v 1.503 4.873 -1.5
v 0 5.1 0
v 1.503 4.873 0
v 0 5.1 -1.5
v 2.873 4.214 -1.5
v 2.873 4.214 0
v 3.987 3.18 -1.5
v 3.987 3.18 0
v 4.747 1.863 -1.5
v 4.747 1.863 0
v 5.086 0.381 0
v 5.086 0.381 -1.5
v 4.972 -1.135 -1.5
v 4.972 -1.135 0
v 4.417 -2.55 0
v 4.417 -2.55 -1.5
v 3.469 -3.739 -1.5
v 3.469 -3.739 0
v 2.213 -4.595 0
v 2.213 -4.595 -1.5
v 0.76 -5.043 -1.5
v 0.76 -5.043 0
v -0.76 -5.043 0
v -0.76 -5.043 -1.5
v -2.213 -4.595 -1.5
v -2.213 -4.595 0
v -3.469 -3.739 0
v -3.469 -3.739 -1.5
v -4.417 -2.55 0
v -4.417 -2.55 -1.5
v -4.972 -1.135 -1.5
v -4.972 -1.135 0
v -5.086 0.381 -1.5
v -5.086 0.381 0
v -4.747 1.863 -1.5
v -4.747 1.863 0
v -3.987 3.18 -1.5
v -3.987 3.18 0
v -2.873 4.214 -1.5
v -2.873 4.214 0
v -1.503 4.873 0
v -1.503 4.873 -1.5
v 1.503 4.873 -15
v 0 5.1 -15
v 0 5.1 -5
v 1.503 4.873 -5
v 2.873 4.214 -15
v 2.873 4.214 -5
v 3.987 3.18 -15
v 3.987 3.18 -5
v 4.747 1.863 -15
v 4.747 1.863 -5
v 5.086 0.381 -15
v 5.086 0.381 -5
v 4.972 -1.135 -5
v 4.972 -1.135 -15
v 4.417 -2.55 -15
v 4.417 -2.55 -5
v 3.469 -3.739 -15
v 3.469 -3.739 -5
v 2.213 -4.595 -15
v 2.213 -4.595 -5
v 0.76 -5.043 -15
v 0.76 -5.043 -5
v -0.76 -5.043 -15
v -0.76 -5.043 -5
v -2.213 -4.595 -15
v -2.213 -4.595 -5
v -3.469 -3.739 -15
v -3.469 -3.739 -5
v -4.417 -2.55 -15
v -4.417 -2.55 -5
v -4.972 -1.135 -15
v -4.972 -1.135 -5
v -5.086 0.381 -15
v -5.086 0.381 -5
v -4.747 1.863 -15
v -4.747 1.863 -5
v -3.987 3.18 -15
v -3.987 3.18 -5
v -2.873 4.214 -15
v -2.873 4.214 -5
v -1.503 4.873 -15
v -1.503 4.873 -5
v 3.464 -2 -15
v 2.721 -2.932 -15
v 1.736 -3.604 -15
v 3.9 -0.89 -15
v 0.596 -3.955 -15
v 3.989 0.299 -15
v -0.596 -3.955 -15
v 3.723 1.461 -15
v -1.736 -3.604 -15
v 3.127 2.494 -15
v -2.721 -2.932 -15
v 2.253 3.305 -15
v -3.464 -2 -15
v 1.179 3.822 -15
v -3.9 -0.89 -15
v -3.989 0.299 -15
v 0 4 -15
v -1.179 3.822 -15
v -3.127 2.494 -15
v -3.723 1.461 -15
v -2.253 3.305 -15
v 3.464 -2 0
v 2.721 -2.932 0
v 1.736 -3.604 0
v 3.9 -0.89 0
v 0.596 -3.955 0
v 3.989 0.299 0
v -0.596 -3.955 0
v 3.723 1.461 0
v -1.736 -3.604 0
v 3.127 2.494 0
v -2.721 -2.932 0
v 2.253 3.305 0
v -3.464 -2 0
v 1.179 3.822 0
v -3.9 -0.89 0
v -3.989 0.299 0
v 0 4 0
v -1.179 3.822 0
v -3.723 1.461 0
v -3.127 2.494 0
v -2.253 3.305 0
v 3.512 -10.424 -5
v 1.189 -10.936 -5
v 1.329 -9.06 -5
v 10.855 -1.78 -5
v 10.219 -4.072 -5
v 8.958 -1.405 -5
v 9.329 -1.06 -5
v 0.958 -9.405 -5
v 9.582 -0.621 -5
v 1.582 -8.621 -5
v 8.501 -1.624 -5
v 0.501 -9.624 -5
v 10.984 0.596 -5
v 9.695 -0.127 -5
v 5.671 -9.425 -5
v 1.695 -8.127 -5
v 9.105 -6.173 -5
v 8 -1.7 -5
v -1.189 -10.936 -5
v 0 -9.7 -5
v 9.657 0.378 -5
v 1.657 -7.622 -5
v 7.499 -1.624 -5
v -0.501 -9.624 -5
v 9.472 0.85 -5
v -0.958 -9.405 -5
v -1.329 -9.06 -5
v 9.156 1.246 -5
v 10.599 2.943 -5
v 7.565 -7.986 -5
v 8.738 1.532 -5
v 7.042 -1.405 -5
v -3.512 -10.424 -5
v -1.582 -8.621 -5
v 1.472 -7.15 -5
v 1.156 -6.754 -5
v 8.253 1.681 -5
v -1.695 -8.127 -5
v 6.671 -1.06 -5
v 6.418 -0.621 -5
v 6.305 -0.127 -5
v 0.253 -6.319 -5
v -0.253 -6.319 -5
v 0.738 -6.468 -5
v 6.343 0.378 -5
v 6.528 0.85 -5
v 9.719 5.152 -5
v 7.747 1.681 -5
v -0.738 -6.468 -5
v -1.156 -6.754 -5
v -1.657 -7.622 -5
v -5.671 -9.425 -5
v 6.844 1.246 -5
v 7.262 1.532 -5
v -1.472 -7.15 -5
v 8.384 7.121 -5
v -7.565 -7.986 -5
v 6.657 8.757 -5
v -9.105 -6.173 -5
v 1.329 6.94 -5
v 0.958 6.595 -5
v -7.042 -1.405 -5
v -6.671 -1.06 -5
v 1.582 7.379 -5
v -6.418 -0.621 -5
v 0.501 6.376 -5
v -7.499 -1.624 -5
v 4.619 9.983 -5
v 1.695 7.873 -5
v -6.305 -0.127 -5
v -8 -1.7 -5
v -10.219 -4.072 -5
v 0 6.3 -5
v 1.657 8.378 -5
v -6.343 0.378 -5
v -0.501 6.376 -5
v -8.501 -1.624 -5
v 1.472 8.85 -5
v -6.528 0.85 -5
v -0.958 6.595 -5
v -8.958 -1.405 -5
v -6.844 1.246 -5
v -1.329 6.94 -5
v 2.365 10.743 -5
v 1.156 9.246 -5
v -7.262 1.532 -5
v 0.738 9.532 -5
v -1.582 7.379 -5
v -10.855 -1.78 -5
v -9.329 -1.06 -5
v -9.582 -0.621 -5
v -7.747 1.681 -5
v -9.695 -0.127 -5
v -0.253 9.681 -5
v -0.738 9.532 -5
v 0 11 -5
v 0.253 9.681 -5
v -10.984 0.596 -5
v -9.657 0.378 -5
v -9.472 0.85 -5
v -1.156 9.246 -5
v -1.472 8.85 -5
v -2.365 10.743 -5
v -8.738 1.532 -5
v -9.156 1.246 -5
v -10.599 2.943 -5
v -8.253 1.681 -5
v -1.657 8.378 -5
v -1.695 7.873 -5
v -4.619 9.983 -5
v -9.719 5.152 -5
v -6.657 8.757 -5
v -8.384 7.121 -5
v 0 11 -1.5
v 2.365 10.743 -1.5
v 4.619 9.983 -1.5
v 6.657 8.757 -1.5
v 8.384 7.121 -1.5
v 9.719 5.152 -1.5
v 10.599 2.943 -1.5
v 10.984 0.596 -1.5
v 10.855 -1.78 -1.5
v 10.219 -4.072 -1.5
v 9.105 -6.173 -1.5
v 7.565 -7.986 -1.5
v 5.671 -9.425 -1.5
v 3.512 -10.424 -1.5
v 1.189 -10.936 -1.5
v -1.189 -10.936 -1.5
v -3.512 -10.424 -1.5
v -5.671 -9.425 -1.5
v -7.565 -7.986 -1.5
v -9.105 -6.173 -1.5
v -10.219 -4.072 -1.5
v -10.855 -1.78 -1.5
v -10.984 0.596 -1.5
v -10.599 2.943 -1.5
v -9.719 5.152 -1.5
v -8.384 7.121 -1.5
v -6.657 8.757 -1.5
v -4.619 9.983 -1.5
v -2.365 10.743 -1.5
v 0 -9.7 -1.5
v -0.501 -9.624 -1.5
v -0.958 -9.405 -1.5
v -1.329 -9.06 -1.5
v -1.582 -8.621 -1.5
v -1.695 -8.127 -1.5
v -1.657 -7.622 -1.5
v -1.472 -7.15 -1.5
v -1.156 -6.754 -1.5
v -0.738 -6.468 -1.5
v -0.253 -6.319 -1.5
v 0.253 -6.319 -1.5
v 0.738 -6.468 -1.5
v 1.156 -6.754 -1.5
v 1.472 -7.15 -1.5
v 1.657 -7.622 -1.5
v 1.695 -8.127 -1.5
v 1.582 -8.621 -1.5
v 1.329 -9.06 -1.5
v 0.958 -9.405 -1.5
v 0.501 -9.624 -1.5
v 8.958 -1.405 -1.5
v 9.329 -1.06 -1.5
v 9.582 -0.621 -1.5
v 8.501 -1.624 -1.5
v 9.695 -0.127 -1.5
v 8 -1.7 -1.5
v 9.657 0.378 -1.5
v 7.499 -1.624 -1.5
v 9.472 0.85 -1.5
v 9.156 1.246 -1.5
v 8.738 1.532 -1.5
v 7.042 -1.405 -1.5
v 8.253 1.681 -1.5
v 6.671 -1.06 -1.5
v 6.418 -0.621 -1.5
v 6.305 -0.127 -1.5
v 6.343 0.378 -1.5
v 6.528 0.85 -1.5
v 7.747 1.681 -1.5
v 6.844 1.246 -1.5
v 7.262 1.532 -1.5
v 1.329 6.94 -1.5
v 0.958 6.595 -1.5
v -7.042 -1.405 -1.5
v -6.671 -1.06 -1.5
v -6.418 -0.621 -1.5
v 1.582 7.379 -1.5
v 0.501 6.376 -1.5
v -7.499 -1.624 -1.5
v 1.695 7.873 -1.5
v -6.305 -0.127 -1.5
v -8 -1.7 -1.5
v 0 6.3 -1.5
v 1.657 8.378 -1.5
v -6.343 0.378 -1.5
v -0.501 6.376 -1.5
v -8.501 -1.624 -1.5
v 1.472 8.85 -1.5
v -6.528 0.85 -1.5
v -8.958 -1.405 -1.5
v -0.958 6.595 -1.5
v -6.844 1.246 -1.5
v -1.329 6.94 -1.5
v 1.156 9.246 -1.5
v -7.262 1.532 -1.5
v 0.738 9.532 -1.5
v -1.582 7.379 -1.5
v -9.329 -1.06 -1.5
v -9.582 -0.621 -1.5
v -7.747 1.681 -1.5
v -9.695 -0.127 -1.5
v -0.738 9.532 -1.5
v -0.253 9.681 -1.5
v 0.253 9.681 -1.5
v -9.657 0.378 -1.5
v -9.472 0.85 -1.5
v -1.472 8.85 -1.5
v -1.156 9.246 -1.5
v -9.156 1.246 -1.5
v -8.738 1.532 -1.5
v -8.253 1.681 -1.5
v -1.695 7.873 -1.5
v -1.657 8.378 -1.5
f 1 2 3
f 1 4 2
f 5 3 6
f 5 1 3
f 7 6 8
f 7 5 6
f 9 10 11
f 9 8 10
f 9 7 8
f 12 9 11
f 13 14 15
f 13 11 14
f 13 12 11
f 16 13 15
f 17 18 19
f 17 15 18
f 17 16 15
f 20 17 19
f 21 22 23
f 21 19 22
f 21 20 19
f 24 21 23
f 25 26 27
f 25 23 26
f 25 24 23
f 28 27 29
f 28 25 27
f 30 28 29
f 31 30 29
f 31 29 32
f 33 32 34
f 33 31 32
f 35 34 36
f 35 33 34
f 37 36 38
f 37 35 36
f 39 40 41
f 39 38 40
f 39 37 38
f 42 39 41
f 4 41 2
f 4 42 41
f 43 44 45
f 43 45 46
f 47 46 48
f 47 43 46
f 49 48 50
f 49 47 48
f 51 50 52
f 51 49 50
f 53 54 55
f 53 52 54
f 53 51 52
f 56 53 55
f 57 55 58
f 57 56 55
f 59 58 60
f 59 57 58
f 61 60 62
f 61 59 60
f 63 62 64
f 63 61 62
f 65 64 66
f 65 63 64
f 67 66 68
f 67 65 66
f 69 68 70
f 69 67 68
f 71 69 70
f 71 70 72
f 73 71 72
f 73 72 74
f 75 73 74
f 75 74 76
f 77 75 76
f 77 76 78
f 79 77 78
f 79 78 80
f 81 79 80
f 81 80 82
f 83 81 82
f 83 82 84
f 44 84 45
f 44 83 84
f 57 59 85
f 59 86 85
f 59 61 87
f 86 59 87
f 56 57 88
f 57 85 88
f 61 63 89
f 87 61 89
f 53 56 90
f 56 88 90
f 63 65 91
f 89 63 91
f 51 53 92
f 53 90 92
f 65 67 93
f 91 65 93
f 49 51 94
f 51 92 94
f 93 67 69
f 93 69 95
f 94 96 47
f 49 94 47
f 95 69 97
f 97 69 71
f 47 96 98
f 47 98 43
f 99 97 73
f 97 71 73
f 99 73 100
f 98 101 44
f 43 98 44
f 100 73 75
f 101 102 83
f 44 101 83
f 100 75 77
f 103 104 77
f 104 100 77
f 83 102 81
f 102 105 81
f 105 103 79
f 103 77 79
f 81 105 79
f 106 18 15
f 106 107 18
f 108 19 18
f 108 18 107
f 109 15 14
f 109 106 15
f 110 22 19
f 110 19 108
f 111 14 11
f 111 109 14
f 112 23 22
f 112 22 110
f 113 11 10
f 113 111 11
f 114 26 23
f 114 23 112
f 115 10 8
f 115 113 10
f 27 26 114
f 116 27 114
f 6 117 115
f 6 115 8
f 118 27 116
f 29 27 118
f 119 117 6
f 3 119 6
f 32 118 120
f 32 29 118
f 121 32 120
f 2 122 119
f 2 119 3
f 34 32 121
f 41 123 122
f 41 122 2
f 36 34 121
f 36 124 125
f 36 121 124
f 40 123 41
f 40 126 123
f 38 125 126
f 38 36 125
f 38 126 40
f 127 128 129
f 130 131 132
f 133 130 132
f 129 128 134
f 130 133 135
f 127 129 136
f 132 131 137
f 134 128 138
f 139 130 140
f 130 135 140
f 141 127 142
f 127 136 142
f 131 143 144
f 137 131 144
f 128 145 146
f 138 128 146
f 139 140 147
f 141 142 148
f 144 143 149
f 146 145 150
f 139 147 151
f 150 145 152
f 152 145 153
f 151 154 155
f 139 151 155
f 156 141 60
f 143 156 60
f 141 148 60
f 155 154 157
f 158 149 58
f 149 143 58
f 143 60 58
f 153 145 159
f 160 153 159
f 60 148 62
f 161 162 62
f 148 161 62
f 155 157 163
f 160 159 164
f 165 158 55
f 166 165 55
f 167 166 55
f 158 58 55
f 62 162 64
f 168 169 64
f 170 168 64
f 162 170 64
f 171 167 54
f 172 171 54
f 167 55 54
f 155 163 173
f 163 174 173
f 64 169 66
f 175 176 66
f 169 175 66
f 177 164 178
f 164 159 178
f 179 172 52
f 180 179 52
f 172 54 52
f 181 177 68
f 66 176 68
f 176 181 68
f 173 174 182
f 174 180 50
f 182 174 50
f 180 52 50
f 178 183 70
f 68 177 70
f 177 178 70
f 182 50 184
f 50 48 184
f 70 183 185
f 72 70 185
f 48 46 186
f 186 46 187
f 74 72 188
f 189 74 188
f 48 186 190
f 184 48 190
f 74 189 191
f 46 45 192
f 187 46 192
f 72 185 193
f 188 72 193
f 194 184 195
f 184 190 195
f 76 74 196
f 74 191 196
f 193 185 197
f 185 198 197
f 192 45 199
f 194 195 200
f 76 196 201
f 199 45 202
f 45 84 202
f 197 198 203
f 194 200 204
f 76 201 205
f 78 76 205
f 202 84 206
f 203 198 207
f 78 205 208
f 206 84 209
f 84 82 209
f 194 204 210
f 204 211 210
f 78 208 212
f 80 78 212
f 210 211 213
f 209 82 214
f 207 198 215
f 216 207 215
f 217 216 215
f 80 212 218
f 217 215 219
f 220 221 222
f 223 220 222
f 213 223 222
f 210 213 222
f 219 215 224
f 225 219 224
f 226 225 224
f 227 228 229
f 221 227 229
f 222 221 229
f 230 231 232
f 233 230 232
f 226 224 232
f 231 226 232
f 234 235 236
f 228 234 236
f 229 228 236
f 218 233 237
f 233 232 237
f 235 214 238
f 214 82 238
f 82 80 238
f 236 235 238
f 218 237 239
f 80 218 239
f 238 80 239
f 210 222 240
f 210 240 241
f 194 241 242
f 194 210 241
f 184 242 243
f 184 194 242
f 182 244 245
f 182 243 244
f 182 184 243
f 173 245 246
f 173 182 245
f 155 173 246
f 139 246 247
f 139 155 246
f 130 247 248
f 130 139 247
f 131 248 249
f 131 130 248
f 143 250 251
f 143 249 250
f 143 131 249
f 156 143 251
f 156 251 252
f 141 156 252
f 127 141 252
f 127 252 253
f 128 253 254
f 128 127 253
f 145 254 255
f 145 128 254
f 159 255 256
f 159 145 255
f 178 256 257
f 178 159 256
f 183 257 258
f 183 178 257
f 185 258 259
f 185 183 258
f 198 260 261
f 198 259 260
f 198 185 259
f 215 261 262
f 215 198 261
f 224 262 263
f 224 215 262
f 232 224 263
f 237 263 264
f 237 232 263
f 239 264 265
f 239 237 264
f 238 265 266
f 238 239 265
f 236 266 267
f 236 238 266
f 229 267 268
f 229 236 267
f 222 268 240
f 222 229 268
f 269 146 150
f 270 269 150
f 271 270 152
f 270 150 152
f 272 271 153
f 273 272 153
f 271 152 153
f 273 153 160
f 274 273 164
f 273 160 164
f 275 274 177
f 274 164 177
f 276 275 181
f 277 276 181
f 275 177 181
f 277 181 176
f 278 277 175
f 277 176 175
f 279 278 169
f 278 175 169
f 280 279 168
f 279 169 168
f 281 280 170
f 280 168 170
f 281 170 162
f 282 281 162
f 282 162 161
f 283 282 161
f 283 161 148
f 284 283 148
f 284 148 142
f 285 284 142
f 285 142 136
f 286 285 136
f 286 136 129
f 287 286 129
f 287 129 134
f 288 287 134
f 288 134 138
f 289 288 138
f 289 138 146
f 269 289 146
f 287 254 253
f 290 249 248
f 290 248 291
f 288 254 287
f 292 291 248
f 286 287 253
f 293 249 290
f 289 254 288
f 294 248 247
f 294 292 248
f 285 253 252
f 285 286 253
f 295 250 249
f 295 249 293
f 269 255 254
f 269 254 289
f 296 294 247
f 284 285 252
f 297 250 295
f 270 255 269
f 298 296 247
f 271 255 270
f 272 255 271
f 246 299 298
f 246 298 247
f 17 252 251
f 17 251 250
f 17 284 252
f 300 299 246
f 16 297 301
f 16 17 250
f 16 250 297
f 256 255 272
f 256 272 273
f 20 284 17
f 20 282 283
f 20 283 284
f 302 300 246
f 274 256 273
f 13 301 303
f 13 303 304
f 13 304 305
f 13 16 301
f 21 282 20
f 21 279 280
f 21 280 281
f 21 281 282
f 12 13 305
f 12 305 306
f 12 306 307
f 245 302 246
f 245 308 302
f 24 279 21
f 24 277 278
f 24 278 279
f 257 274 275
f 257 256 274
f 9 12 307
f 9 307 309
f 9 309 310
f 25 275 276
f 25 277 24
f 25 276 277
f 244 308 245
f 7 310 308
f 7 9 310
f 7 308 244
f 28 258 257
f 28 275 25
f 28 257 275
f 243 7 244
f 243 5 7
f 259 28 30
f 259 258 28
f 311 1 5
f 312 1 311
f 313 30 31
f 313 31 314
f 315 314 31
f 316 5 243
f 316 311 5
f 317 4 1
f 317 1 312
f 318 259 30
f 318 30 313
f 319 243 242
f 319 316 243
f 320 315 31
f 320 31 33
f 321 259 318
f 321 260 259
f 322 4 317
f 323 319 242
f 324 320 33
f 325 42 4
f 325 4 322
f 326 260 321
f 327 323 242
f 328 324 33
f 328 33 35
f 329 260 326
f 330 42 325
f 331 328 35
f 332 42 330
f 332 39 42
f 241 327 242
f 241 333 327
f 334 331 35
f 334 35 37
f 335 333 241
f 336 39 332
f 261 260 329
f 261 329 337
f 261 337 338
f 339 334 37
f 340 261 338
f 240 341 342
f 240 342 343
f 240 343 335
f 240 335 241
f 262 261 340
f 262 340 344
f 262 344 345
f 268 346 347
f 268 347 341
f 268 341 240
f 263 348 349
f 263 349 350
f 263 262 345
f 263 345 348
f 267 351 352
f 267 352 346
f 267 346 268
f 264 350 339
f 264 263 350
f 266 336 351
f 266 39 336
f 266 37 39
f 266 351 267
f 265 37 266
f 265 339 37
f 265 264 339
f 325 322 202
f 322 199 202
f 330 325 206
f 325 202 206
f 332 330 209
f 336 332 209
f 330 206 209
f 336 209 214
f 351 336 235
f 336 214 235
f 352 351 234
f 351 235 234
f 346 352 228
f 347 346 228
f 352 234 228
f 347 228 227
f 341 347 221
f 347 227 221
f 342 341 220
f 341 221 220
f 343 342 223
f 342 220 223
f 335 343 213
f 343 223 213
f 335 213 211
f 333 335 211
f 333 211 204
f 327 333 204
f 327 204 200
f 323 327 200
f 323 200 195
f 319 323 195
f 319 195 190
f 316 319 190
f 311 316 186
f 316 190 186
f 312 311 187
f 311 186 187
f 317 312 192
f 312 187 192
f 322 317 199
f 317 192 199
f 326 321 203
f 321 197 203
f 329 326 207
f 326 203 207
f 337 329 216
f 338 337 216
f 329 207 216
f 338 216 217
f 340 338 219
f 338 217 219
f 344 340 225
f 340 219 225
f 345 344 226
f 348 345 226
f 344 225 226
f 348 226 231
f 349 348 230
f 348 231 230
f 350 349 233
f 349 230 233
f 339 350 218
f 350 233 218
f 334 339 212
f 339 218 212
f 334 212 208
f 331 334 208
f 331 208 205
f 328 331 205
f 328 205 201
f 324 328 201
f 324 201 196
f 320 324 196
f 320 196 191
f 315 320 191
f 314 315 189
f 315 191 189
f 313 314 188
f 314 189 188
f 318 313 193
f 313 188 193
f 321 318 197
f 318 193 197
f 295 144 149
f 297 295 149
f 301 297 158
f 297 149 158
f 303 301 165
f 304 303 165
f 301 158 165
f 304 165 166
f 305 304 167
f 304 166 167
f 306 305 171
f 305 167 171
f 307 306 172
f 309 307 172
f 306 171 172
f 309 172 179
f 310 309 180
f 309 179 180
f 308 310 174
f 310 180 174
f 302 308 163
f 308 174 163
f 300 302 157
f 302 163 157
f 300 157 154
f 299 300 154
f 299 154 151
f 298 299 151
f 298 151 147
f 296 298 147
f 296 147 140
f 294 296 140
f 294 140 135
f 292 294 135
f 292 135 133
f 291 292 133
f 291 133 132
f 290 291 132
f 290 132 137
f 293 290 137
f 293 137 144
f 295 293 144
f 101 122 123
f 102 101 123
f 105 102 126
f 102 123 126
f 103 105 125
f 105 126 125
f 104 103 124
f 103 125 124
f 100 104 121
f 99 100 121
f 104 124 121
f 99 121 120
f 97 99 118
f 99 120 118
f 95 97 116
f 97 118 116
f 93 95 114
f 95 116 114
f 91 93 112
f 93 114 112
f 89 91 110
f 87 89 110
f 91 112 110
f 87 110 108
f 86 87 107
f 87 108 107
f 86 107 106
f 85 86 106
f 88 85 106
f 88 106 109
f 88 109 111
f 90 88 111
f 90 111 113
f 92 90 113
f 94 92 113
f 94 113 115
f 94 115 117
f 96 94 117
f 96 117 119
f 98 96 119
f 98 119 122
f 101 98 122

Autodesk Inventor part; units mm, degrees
ref_plane "YZ Plane" through (0, 0, 0) normal (1, 0, 0) x (0, 1, 0)
ref_plane "XZ Plane" through (0, 0, 0) normal (0, 1, 0) x (-1, 0, 0)
ref_plane "XY Plane" through (0, 0, 0) normal (0, 0, 1) x (1, 0, 0)
sketch "スケッチ1" plane through (0, 0, 0) normal (1, 0, 0) x (0, 1, 0)
  line L0 (0, 0) -> (5.1, 0)
  line L1 (5.1, 0) -> (5.1, -1.5)
  line L2 (5.1, -1.5) -> (11, -1.5)
  line L3 (11, -1.5) -> (11, -5)
  line L4 (11, -5) -> (5.1, -5)
  line L5 (5.1, -5) -> (5.1, -15)
  line L6 (5.1, -15) -> (4, -15)
  line L7 (4, -15) -> (4, 0)
  line L8 (0, -18) -> (0, 3) projected
  dimension "d0" = 4
  dimension "d1" = 1.5
  dimension "d2" = 3.5
  dimension "d3" = 10
  dimension "d4" = 11
  dimension "d5" = 5.1
revolve "回転1" add sketch "スケッチ1" angle 360 about axis through (0, 0, -10) along (0, 0, 1)
sketch "スケッチ2" plane through (0, 0, -1.5) normal (0, 0, 1) x (1, 0, 0)
  circle A0 centre (0, 0) radius 8
  point P0 (0, 8)
  point P1 (-8, 0)
  point P2 (0, -8)
  point P3 (8, 0)
  dimension "d7" = 16
  dimension "d10" = 360
hole "穴1" at (0, 8, -1.5) at (-8, 0, -1.5) at (0, -8, -1.5) at (8, 0, -1.5) direction (0, 0, -1) diameter 3.4 end through all clearance for "Socket Head Cap Screw" size "M3" standard "Ansi Metric M Profile"
thread "ねじ1" size "M8x1.25" class "6H" standard "ANSI Metric M Profile" full length
properties part number "lead-screw-nut" material "真鍮、ソフト イエロー"
